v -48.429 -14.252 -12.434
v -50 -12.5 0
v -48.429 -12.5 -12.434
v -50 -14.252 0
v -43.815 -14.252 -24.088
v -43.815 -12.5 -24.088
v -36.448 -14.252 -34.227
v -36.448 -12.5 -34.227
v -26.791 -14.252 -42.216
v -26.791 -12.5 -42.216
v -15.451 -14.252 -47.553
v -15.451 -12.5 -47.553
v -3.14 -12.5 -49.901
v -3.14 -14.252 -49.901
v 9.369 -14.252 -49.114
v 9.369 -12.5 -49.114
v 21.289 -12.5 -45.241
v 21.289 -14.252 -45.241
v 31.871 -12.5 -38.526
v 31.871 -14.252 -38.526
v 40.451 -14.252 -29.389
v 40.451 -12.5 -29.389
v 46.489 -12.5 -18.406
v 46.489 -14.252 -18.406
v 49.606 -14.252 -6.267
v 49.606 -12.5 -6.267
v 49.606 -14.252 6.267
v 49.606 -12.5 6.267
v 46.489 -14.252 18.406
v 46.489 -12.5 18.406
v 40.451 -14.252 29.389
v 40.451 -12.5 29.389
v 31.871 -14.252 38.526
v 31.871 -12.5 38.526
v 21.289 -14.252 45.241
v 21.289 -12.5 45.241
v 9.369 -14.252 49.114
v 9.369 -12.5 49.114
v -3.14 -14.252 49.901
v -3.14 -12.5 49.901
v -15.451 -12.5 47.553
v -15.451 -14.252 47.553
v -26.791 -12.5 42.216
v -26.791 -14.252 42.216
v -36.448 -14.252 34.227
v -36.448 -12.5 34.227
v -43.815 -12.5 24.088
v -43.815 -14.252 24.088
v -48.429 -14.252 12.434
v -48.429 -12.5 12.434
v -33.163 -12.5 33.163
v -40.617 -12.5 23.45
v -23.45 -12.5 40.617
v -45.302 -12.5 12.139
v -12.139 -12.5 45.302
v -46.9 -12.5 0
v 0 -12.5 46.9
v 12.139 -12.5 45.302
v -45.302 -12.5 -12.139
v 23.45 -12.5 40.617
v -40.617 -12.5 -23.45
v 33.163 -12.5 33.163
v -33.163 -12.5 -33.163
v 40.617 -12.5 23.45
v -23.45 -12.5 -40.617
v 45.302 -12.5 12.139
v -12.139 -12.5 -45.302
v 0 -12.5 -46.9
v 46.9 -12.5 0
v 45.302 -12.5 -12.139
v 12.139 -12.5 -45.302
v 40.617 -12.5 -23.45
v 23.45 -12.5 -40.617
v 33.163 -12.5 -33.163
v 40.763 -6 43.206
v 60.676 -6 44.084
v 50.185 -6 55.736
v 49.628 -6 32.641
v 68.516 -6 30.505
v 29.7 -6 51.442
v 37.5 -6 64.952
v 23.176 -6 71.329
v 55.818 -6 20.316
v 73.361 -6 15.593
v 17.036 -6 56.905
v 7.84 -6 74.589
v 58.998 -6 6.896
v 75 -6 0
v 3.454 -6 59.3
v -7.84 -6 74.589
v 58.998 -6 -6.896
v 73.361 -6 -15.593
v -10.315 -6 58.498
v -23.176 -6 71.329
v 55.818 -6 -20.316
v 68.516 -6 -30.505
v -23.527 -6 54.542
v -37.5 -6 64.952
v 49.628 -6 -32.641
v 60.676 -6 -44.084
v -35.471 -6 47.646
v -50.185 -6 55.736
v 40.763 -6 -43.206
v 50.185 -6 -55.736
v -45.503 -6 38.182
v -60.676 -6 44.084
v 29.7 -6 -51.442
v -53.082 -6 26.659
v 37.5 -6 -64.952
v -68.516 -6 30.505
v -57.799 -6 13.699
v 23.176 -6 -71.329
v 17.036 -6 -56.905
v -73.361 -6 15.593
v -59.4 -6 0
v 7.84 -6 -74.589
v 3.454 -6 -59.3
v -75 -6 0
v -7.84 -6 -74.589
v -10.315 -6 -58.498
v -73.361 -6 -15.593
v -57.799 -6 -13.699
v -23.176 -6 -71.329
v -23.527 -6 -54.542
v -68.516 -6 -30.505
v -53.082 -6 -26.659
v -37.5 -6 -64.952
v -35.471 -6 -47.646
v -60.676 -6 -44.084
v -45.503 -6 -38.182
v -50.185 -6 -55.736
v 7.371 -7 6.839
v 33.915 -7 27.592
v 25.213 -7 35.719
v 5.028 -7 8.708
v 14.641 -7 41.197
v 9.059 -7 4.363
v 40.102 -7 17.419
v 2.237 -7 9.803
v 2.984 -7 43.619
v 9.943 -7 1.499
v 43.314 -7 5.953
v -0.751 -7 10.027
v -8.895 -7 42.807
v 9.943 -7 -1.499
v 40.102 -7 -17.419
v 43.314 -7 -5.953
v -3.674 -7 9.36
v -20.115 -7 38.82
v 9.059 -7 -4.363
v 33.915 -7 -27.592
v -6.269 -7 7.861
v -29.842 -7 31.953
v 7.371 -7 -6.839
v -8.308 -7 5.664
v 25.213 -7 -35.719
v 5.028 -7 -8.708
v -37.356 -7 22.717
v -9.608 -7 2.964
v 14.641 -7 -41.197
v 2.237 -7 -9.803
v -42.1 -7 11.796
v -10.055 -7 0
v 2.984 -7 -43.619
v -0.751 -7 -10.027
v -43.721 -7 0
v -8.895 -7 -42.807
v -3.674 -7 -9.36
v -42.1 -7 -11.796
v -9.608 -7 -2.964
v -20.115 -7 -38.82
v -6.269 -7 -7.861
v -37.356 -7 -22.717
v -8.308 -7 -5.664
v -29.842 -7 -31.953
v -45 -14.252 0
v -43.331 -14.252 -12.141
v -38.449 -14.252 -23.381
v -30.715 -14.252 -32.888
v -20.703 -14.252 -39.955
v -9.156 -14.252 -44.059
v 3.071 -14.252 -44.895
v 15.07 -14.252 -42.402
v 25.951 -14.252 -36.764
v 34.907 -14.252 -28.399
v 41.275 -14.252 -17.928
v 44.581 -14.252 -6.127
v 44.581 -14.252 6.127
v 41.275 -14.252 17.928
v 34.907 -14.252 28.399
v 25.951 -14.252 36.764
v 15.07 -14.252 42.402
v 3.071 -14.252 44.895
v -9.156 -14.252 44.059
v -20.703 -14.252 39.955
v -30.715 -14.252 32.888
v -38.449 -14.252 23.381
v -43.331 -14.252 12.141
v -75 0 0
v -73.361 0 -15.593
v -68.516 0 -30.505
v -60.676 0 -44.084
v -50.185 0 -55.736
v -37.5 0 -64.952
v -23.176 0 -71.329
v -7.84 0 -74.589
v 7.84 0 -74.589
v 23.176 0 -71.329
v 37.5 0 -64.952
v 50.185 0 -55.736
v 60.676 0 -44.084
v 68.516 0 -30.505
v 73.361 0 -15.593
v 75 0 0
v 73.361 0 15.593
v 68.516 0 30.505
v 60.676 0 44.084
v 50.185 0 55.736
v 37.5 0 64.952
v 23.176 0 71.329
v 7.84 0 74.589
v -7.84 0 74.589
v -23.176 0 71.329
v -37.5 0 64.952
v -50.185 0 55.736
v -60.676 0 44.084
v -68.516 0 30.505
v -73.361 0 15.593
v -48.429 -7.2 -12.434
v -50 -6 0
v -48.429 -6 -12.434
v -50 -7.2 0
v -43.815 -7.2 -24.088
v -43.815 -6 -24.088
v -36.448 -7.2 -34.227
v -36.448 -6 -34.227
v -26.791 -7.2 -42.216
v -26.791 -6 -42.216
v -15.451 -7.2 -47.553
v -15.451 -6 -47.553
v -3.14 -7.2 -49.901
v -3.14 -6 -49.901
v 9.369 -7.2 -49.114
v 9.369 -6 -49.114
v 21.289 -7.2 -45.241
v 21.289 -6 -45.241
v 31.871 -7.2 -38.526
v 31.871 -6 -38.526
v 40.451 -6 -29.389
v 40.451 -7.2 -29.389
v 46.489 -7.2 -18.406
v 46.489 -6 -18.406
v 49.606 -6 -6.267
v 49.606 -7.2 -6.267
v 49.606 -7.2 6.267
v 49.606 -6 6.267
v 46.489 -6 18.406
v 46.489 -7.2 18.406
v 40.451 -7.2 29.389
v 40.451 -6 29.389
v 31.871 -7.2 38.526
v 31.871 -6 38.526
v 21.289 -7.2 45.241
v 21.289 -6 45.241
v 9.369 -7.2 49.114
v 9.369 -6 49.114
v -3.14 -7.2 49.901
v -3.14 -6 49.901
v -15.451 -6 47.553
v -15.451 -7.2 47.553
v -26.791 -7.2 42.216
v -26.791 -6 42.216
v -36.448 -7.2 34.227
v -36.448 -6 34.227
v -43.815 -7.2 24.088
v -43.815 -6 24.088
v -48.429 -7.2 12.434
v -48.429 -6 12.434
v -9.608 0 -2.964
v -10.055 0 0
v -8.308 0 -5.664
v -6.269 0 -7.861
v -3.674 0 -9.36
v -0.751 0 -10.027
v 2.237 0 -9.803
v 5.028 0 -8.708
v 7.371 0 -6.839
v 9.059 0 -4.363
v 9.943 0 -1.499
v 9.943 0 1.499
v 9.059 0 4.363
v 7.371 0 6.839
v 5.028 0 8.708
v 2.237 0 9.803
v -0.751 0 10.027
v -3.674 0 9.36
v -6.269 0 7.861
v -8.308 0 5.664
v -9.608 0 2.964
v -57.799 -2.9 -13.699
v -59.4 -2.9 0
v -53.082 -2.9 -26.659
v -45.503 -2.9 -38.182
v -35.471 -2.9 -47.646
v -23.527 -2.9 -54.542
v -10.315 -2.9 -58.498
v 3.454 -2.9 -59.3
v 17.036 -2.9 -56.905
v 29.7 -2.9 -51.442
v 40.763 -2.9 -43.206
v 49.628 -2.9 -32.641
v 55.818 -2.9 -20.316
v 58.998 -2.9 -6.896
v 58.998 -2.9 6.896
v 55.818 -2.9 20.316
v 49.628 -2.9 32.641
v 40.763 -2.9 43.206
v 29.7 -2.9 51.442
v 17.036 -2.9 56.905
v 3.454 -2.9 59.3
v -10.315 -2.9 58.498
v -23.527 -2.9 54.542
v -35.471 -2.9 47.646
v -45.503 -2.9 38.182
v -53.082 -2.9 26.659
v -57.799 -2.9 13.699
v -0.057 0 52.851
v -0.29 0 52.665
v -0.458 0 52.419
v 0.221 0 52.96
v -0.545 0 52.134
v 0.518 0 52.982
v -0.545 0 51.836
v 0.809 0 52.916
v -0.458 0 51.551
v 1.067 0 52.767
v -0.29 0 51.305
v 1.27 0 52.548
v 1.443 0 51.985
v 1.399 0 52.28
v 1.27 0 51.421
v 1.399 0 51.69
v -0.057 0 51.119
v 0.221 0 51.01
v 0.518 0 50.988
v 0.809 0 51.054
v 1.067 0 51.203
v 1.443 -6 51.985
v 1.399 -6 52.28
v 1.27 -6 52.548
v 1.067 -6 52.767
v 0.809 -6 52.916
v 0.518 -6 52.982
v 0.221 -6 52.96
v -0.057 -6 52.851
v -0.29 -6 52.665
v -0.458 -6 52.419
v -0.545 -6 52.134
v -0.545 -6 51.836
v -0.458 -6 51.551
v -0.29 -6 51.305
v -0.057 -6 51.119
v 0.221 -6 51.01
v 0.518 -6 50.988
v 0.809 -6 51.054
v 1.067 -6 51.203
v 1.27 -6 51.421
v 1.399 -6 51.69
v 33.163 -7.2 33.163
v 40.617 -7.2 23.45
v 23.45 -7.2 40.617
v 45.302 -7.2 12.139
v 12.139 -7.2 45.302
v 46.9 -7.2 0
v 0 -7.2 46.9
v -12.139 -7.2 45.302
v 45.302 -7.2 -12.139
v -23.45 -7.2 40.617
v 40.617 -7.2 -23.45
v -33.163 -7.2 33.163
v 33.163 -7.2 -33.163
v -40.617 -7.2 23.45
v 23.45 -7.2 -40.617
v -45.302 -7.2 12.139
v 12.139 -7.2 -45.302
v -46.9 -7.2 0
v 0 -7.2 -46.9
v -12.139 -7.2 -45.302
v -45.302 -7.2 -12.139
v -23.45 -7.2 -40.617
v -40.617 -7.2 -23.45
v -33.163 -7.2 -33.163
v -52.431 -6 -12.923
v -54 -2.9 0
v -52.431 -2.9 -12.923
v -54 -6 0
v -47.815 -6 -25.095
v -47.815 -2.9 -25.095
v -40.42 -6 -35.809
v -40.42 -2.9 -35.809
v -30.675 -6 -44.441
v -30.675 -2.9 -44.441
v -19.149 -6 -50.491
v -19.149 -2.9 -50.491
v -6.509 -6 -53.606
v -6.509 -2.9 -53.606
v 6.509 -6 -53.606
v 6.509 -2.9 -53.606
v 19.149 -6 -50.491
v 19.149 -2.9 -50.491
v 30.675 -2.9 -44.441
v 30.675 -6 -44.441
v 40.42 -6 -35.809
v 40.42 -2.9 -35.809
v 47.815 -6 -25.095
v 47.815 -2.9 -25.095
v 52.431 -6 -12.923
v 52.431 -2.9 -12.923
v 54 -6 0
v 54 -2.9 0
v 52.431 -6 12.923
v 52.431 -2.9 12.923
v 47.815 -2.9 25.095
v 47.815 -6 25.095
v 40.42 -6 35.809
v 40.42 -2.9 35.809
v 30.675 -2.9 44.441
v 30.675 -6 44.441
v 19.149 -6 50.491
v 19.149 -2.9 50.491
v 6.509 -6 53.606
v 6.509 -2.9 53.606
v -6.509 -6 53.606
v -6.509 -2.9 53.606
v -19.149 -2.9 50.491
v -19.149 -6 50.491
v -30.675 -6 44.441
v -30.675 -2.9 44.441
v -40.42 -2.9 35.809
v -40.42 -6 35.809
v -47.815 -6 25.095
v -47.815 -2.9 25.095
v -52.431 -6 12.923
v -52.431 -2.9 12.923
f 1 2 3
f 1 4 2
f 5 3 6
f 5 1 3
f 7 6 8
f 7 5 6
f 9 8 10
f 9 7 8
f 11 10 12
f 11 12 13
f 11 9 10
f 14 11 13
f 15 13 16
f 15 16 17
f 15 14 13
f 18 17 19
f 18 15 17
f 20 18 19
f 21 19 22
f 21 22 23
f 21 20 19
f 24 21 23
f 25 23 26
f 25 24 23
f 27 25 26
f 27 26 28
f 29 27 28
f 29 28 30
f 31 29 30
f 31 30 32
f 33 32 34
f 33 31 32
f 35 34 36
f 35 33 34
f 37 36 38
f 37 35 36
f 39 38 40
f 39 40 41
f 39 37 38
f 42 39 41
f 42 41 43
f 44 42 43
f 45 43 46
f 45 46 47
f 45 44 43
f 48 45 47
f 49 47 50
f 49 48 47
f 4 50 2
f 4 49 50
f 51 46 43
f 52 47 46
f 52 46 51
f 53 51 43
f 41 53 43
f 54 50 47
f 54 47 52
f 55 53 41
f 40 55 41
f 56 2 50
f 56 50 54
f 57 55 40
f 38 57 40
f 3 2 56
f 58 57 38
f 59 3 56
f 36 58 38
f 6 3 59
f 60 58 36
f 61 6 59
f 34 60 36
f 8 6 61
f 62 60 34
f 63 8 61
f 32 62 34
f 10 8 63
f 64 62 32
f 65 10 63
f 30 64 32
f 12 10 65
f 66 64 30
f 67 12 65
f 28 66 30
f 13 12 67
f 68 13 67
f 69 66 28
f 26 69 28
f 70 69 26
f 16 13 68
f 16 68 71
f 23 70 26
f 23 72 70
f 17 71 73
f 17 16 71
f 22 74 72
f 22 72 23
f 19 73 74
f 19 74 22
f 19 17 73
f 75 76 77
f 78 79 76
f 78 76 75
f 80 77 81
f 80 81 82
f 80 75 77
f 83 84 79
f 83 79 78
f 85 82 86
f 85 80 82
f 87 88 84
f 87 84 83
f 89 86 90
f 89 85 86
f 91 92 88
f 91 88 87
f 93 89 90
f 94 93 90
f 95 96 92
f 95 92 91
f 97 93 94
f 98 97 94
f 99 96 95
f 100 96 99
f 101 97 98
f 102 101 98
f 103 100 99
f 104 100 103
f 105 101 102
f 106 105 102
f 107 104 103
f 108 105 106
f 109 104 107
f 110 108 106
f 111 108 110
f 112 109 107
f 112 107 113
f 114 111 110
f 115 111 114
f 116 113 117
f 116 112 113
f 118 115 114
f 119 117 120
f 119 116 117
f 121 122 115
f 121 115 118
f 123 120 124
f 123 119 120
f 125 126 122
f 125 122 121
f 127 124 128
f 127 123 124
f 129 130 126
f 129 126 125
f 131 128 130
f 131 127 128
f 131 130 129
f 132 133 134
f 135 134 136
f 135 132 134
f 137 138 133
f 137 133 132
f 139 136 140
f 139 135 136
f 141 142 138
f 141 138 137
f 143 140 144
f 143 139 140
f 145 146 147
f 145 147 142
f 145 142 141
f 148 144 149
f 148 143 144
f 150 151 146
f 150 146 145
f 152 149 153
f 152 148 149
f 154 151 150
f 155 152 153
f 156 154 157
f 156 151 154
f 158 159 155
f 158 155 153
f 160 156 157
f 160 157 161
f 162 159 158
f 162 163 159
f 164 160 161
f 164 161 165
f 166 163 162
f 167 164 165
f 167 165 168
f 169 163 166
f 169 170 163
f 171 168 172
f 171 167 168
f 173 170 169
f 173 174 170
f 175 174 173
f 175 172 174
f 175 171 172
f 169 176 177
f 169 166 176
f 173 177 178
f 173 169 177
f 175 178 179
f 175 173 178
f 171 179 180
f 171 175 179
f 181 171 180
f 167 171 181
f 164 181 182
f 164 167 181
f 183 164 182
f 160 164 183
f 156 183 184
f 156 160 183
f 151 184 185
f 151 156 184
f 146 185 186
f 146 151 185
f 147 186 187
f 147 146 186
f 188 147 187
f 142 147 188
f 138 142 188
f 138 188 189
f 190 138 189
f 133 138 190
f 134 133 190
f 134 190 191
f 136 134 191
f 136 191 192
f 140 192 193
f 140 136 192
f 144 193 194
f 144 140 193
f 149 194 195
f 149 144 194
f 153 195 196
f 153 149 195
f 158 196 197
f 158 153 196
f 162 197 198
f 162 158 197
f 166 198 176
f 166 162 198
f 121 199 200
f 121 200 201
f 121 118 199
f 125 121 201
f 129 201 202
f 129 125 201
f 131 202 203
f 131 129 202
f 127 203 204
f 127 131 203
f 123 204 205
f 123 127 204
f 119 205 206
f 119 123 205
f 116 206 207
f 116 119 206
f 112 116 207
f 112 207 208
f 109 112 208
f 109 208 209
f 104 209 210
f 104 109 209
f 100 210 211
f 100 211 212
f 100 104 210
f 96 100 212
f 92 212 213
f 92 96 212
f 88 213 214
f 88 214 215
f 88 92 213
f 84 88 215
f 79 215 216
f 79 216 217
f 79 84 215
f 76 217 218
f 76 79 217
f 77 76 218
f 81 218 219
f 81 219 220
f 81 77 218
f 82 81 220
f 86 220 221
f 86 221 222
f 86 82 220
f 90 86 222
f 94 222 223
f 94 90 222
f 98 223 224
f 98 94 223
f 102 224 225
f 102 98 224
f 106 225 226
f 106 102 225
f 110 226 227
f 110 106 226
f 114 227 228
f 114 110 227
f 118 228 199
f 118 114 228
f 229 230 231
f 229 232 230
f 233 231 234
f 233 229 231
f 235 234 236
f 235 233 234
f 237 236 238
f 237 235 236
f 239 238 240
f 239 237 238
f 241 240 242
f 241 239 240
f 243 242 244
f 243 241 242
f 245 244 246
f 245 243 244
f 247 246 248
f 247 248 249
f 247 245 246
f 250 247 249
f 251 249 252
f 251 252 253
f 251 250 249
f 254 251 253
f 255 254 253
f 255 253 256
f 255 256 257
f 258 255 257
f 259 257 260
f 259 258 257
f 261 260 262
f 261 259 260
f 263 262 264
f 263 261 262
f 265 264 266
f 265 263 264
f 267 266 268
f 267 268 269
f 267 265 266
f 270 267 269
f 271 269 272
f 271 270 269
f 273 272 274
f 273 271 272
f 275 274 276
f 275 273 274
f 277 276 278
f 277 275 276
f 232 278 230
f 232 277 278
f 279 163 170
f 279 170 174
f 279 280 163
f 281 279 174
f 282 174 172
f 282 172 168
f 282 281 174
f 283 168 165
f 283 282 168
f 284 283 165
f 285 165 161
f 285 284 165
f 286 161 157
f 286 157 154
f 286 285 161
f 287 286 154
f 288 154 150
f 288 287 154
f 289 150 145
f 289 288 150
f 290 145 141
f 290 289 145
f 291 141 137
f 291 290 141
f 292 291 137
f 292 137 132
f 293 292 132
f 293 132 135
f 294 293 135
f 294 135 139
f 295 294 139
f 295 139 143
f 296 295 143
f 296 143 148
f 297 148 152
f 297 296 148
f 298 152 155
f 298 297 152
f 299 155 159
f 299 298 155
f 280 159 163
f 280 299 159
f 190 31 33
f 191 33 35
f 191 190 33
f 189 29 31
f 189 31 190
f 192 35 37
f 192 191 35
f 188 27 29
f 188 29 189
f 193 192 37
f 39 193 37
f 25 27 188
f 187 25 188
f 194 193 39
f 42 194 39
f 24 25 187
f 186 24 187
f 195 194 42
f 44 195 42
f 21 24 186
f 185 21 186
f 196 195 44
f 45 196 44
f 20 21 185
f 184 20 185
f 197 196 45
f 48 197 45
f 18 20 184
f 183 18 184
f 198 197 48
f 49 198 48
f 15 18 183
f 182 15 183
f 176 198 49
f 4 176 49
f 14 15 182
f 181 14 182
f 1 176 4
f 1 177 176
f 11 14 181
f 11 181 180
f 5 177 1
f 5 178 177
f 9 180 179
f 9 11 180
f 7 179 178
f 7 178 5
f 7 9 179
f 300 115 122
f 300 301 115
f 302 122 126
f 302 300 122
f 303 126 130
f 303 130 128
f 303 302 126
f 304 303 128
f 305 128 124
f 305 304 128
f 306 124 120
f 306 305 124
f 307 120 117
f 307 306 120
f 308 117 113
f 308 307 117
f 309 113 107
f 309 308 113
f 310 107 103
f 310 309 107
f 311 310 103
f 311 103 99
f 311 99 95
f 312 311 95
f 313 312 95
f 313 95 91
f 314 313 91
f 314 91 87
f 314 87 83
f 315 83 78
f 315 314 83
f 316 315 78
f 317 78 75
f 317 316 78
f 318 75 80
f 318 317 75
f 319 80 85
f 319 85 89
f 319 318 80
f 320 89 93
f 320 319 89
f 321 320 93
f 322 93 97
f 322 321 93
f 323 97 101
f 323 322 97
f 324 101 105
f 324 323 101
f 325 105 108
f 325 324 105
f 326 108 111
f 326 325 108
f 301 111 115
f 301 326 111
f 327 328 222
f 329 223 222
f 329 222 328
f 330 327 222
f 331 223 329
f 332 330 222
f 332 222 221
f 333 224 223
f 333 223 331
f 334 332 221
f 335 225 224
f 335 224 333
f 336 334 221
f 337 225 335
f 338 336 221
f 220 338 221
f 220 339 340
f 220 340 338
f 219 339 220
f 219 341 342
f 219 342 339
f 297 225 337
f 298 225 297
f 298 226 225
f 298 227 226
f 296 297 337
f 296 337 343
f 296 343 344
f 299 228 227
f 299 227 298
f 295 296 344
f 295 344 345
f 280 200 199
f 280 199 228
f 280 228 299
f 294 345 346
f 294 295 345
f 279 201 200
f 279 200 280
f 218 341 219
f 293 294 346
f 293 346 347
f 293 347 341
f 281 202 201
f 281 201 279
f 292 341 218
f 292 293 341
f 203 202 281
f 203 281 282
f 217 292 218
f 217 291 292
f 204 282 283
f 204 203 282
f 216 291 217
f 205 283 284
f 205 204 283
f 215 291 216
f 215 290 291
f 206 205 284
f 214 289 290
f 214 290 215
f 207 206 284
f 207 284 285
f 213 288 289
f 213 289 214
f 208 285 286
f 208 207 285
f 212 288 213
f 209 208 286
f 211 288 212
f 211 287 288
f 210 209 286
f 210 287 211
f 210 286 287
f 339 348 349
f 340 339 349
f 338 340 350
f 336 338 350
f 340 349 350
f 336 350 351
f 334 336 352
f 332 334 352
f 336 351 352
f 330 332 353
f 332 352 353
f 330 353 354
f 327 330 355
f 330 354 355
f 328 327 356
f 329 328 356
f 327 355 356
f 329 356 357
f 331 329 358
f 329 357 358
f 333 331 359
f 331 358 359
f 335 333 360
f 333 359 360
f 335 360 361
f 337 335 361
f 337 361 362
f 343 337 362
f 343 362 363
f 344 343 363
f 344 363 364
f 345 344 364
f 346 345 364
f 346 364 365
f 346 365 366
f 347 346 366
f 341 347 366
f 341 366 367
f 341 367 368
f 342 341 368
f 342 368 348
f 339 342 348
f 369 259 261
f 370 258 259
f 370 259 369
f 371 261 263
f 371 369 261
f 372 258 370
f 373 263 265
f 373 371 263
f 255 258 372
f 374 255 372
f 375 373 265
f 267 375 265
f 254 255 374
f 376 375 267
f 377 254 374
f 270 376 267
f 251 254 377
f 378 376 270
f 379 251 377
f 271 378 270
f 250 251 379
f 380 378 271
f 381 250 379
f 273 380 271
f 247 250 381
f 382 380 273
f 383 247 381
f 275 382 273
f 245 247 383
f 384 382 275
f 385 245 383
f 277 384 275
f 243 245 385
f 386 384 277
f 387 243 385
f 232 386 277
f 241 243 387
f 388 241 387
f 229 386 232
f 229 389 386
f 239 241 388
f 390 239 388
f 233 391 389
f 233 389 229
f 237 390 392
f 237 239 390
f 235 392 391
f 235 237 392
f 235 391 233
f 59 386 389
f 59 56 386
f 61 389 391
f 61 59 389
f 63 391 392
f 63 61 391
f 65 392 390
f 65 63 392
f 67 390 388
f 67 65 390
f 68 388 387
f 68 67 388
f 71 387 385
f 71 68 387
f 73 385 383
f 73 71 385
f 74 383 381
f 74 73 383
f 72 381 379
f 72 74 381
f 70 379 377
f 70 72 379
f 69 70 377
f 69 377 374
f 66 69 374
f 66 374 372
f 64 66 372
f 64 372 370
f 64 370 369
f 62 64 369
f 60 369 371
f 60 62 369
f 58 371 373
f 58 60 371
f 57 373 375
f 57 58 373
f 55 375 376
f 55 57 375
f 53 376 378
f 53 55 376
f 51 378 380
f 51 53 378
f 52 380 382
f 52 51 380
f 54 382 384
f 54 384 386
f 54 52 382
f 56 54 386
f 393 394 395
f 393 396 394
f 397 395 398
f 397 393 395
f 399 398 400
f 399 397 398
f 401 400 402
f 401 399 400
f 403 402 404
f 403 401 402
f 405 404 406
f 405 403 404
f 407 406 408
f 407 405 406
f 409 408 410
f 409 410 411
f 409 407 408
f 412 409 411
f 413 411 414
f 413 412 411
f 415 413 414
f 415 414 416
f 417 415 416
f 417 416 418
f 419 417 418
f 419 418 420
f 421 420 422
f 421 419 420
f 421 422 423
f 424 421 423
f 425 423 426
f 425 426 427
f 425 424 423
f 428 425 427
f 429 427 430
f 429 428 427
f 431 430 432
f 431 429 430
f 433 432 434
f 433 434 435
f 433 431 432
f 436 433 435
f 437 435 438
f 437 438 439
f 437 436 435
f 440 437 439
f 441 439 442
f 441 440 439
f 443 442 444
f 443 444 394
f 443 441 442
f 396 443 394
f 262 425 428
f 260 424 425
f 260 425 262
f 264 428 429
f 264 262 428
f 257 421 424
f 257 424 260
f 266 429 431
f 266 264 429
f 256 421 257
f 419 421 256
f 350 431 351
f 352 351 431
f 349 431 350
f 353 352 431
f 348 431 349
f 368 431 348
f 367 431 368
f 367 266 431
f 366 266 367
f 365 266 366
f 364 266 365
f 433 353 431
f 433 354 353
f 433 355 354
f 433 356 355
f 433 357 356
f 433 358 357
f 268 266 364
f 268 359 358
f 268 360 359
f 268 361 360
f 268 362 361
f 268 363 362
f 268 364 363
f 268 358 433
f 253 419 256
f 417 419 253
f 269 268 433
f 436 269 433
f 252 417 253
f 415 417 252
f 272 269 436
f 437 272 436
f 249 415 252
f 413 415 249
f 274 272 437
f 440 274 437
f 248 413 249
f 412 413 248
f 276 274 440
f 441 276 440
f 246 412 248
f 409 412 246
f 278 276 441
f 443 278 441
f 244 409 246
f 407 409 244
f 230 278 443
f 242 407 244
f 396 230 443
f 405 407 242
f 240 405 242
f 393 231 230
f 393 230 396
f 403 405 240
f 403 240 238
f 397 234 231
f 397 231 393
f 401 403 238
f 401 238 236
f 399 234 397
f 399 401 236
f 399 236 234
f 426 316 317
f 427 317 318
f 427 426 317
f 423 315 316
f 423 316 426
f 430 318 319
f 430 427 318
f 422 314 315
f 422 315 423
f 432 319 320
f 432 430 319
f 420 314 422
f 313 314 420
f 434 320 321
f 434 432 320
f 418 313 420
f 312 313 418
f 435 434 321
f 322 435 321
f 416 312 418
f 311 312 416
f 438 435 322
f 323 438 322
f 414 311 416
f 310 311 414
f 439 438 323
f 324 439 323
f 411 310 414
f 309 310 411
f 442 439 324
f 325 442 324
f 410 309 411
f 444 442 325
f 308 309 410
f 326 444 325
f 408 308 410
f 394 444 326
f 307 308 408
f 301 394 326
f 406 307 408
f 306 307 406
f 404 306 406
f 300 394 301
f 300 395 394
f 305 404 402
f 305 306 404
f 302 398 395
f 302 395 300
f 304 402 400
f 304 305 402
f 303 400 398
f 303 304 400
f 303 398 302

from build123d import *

# Parameters (mm, degrees)
SZKIC2_R                   = 1
WYTNIJ_WYCI_GNI_CIE1_DEPTH = 10


with BuildPart() as part:
    # Szkic1 → Obrót1 (revolve)
    with BuildSketch(Plane.XY):
        Polygon((-10.055, -7), (-10.055, 0), (-75, 0), (-75, -6), (-59.4, -6), (-59.4, -2.9), (-54, -2.9), (-54, -6), (-50, -6), (-50, -7.2), (-46.9, -7.2), (-46.9, -12.5), (-50, -12.5), (-50, -14.251552945), (-45, -14.251552945), (-43.721355564, -7), align=None)
    revolve(axis=Axis((0, 0, 0), (0, -1, 0)))

    # Szkic2 → Wytnij-wyciągnięcie1 (cut)
    with BuildSketch(Plane.XZ.offset(6)):
        with Locations((0.44346391, 51.984815166)):
            Circle(SZKIC2_R)
    extrude(amount=-WYTNIJ_WYCI_GNI_CIE1_DEPTH, mode=Mode.SUBTRACT)


solid = part.part
